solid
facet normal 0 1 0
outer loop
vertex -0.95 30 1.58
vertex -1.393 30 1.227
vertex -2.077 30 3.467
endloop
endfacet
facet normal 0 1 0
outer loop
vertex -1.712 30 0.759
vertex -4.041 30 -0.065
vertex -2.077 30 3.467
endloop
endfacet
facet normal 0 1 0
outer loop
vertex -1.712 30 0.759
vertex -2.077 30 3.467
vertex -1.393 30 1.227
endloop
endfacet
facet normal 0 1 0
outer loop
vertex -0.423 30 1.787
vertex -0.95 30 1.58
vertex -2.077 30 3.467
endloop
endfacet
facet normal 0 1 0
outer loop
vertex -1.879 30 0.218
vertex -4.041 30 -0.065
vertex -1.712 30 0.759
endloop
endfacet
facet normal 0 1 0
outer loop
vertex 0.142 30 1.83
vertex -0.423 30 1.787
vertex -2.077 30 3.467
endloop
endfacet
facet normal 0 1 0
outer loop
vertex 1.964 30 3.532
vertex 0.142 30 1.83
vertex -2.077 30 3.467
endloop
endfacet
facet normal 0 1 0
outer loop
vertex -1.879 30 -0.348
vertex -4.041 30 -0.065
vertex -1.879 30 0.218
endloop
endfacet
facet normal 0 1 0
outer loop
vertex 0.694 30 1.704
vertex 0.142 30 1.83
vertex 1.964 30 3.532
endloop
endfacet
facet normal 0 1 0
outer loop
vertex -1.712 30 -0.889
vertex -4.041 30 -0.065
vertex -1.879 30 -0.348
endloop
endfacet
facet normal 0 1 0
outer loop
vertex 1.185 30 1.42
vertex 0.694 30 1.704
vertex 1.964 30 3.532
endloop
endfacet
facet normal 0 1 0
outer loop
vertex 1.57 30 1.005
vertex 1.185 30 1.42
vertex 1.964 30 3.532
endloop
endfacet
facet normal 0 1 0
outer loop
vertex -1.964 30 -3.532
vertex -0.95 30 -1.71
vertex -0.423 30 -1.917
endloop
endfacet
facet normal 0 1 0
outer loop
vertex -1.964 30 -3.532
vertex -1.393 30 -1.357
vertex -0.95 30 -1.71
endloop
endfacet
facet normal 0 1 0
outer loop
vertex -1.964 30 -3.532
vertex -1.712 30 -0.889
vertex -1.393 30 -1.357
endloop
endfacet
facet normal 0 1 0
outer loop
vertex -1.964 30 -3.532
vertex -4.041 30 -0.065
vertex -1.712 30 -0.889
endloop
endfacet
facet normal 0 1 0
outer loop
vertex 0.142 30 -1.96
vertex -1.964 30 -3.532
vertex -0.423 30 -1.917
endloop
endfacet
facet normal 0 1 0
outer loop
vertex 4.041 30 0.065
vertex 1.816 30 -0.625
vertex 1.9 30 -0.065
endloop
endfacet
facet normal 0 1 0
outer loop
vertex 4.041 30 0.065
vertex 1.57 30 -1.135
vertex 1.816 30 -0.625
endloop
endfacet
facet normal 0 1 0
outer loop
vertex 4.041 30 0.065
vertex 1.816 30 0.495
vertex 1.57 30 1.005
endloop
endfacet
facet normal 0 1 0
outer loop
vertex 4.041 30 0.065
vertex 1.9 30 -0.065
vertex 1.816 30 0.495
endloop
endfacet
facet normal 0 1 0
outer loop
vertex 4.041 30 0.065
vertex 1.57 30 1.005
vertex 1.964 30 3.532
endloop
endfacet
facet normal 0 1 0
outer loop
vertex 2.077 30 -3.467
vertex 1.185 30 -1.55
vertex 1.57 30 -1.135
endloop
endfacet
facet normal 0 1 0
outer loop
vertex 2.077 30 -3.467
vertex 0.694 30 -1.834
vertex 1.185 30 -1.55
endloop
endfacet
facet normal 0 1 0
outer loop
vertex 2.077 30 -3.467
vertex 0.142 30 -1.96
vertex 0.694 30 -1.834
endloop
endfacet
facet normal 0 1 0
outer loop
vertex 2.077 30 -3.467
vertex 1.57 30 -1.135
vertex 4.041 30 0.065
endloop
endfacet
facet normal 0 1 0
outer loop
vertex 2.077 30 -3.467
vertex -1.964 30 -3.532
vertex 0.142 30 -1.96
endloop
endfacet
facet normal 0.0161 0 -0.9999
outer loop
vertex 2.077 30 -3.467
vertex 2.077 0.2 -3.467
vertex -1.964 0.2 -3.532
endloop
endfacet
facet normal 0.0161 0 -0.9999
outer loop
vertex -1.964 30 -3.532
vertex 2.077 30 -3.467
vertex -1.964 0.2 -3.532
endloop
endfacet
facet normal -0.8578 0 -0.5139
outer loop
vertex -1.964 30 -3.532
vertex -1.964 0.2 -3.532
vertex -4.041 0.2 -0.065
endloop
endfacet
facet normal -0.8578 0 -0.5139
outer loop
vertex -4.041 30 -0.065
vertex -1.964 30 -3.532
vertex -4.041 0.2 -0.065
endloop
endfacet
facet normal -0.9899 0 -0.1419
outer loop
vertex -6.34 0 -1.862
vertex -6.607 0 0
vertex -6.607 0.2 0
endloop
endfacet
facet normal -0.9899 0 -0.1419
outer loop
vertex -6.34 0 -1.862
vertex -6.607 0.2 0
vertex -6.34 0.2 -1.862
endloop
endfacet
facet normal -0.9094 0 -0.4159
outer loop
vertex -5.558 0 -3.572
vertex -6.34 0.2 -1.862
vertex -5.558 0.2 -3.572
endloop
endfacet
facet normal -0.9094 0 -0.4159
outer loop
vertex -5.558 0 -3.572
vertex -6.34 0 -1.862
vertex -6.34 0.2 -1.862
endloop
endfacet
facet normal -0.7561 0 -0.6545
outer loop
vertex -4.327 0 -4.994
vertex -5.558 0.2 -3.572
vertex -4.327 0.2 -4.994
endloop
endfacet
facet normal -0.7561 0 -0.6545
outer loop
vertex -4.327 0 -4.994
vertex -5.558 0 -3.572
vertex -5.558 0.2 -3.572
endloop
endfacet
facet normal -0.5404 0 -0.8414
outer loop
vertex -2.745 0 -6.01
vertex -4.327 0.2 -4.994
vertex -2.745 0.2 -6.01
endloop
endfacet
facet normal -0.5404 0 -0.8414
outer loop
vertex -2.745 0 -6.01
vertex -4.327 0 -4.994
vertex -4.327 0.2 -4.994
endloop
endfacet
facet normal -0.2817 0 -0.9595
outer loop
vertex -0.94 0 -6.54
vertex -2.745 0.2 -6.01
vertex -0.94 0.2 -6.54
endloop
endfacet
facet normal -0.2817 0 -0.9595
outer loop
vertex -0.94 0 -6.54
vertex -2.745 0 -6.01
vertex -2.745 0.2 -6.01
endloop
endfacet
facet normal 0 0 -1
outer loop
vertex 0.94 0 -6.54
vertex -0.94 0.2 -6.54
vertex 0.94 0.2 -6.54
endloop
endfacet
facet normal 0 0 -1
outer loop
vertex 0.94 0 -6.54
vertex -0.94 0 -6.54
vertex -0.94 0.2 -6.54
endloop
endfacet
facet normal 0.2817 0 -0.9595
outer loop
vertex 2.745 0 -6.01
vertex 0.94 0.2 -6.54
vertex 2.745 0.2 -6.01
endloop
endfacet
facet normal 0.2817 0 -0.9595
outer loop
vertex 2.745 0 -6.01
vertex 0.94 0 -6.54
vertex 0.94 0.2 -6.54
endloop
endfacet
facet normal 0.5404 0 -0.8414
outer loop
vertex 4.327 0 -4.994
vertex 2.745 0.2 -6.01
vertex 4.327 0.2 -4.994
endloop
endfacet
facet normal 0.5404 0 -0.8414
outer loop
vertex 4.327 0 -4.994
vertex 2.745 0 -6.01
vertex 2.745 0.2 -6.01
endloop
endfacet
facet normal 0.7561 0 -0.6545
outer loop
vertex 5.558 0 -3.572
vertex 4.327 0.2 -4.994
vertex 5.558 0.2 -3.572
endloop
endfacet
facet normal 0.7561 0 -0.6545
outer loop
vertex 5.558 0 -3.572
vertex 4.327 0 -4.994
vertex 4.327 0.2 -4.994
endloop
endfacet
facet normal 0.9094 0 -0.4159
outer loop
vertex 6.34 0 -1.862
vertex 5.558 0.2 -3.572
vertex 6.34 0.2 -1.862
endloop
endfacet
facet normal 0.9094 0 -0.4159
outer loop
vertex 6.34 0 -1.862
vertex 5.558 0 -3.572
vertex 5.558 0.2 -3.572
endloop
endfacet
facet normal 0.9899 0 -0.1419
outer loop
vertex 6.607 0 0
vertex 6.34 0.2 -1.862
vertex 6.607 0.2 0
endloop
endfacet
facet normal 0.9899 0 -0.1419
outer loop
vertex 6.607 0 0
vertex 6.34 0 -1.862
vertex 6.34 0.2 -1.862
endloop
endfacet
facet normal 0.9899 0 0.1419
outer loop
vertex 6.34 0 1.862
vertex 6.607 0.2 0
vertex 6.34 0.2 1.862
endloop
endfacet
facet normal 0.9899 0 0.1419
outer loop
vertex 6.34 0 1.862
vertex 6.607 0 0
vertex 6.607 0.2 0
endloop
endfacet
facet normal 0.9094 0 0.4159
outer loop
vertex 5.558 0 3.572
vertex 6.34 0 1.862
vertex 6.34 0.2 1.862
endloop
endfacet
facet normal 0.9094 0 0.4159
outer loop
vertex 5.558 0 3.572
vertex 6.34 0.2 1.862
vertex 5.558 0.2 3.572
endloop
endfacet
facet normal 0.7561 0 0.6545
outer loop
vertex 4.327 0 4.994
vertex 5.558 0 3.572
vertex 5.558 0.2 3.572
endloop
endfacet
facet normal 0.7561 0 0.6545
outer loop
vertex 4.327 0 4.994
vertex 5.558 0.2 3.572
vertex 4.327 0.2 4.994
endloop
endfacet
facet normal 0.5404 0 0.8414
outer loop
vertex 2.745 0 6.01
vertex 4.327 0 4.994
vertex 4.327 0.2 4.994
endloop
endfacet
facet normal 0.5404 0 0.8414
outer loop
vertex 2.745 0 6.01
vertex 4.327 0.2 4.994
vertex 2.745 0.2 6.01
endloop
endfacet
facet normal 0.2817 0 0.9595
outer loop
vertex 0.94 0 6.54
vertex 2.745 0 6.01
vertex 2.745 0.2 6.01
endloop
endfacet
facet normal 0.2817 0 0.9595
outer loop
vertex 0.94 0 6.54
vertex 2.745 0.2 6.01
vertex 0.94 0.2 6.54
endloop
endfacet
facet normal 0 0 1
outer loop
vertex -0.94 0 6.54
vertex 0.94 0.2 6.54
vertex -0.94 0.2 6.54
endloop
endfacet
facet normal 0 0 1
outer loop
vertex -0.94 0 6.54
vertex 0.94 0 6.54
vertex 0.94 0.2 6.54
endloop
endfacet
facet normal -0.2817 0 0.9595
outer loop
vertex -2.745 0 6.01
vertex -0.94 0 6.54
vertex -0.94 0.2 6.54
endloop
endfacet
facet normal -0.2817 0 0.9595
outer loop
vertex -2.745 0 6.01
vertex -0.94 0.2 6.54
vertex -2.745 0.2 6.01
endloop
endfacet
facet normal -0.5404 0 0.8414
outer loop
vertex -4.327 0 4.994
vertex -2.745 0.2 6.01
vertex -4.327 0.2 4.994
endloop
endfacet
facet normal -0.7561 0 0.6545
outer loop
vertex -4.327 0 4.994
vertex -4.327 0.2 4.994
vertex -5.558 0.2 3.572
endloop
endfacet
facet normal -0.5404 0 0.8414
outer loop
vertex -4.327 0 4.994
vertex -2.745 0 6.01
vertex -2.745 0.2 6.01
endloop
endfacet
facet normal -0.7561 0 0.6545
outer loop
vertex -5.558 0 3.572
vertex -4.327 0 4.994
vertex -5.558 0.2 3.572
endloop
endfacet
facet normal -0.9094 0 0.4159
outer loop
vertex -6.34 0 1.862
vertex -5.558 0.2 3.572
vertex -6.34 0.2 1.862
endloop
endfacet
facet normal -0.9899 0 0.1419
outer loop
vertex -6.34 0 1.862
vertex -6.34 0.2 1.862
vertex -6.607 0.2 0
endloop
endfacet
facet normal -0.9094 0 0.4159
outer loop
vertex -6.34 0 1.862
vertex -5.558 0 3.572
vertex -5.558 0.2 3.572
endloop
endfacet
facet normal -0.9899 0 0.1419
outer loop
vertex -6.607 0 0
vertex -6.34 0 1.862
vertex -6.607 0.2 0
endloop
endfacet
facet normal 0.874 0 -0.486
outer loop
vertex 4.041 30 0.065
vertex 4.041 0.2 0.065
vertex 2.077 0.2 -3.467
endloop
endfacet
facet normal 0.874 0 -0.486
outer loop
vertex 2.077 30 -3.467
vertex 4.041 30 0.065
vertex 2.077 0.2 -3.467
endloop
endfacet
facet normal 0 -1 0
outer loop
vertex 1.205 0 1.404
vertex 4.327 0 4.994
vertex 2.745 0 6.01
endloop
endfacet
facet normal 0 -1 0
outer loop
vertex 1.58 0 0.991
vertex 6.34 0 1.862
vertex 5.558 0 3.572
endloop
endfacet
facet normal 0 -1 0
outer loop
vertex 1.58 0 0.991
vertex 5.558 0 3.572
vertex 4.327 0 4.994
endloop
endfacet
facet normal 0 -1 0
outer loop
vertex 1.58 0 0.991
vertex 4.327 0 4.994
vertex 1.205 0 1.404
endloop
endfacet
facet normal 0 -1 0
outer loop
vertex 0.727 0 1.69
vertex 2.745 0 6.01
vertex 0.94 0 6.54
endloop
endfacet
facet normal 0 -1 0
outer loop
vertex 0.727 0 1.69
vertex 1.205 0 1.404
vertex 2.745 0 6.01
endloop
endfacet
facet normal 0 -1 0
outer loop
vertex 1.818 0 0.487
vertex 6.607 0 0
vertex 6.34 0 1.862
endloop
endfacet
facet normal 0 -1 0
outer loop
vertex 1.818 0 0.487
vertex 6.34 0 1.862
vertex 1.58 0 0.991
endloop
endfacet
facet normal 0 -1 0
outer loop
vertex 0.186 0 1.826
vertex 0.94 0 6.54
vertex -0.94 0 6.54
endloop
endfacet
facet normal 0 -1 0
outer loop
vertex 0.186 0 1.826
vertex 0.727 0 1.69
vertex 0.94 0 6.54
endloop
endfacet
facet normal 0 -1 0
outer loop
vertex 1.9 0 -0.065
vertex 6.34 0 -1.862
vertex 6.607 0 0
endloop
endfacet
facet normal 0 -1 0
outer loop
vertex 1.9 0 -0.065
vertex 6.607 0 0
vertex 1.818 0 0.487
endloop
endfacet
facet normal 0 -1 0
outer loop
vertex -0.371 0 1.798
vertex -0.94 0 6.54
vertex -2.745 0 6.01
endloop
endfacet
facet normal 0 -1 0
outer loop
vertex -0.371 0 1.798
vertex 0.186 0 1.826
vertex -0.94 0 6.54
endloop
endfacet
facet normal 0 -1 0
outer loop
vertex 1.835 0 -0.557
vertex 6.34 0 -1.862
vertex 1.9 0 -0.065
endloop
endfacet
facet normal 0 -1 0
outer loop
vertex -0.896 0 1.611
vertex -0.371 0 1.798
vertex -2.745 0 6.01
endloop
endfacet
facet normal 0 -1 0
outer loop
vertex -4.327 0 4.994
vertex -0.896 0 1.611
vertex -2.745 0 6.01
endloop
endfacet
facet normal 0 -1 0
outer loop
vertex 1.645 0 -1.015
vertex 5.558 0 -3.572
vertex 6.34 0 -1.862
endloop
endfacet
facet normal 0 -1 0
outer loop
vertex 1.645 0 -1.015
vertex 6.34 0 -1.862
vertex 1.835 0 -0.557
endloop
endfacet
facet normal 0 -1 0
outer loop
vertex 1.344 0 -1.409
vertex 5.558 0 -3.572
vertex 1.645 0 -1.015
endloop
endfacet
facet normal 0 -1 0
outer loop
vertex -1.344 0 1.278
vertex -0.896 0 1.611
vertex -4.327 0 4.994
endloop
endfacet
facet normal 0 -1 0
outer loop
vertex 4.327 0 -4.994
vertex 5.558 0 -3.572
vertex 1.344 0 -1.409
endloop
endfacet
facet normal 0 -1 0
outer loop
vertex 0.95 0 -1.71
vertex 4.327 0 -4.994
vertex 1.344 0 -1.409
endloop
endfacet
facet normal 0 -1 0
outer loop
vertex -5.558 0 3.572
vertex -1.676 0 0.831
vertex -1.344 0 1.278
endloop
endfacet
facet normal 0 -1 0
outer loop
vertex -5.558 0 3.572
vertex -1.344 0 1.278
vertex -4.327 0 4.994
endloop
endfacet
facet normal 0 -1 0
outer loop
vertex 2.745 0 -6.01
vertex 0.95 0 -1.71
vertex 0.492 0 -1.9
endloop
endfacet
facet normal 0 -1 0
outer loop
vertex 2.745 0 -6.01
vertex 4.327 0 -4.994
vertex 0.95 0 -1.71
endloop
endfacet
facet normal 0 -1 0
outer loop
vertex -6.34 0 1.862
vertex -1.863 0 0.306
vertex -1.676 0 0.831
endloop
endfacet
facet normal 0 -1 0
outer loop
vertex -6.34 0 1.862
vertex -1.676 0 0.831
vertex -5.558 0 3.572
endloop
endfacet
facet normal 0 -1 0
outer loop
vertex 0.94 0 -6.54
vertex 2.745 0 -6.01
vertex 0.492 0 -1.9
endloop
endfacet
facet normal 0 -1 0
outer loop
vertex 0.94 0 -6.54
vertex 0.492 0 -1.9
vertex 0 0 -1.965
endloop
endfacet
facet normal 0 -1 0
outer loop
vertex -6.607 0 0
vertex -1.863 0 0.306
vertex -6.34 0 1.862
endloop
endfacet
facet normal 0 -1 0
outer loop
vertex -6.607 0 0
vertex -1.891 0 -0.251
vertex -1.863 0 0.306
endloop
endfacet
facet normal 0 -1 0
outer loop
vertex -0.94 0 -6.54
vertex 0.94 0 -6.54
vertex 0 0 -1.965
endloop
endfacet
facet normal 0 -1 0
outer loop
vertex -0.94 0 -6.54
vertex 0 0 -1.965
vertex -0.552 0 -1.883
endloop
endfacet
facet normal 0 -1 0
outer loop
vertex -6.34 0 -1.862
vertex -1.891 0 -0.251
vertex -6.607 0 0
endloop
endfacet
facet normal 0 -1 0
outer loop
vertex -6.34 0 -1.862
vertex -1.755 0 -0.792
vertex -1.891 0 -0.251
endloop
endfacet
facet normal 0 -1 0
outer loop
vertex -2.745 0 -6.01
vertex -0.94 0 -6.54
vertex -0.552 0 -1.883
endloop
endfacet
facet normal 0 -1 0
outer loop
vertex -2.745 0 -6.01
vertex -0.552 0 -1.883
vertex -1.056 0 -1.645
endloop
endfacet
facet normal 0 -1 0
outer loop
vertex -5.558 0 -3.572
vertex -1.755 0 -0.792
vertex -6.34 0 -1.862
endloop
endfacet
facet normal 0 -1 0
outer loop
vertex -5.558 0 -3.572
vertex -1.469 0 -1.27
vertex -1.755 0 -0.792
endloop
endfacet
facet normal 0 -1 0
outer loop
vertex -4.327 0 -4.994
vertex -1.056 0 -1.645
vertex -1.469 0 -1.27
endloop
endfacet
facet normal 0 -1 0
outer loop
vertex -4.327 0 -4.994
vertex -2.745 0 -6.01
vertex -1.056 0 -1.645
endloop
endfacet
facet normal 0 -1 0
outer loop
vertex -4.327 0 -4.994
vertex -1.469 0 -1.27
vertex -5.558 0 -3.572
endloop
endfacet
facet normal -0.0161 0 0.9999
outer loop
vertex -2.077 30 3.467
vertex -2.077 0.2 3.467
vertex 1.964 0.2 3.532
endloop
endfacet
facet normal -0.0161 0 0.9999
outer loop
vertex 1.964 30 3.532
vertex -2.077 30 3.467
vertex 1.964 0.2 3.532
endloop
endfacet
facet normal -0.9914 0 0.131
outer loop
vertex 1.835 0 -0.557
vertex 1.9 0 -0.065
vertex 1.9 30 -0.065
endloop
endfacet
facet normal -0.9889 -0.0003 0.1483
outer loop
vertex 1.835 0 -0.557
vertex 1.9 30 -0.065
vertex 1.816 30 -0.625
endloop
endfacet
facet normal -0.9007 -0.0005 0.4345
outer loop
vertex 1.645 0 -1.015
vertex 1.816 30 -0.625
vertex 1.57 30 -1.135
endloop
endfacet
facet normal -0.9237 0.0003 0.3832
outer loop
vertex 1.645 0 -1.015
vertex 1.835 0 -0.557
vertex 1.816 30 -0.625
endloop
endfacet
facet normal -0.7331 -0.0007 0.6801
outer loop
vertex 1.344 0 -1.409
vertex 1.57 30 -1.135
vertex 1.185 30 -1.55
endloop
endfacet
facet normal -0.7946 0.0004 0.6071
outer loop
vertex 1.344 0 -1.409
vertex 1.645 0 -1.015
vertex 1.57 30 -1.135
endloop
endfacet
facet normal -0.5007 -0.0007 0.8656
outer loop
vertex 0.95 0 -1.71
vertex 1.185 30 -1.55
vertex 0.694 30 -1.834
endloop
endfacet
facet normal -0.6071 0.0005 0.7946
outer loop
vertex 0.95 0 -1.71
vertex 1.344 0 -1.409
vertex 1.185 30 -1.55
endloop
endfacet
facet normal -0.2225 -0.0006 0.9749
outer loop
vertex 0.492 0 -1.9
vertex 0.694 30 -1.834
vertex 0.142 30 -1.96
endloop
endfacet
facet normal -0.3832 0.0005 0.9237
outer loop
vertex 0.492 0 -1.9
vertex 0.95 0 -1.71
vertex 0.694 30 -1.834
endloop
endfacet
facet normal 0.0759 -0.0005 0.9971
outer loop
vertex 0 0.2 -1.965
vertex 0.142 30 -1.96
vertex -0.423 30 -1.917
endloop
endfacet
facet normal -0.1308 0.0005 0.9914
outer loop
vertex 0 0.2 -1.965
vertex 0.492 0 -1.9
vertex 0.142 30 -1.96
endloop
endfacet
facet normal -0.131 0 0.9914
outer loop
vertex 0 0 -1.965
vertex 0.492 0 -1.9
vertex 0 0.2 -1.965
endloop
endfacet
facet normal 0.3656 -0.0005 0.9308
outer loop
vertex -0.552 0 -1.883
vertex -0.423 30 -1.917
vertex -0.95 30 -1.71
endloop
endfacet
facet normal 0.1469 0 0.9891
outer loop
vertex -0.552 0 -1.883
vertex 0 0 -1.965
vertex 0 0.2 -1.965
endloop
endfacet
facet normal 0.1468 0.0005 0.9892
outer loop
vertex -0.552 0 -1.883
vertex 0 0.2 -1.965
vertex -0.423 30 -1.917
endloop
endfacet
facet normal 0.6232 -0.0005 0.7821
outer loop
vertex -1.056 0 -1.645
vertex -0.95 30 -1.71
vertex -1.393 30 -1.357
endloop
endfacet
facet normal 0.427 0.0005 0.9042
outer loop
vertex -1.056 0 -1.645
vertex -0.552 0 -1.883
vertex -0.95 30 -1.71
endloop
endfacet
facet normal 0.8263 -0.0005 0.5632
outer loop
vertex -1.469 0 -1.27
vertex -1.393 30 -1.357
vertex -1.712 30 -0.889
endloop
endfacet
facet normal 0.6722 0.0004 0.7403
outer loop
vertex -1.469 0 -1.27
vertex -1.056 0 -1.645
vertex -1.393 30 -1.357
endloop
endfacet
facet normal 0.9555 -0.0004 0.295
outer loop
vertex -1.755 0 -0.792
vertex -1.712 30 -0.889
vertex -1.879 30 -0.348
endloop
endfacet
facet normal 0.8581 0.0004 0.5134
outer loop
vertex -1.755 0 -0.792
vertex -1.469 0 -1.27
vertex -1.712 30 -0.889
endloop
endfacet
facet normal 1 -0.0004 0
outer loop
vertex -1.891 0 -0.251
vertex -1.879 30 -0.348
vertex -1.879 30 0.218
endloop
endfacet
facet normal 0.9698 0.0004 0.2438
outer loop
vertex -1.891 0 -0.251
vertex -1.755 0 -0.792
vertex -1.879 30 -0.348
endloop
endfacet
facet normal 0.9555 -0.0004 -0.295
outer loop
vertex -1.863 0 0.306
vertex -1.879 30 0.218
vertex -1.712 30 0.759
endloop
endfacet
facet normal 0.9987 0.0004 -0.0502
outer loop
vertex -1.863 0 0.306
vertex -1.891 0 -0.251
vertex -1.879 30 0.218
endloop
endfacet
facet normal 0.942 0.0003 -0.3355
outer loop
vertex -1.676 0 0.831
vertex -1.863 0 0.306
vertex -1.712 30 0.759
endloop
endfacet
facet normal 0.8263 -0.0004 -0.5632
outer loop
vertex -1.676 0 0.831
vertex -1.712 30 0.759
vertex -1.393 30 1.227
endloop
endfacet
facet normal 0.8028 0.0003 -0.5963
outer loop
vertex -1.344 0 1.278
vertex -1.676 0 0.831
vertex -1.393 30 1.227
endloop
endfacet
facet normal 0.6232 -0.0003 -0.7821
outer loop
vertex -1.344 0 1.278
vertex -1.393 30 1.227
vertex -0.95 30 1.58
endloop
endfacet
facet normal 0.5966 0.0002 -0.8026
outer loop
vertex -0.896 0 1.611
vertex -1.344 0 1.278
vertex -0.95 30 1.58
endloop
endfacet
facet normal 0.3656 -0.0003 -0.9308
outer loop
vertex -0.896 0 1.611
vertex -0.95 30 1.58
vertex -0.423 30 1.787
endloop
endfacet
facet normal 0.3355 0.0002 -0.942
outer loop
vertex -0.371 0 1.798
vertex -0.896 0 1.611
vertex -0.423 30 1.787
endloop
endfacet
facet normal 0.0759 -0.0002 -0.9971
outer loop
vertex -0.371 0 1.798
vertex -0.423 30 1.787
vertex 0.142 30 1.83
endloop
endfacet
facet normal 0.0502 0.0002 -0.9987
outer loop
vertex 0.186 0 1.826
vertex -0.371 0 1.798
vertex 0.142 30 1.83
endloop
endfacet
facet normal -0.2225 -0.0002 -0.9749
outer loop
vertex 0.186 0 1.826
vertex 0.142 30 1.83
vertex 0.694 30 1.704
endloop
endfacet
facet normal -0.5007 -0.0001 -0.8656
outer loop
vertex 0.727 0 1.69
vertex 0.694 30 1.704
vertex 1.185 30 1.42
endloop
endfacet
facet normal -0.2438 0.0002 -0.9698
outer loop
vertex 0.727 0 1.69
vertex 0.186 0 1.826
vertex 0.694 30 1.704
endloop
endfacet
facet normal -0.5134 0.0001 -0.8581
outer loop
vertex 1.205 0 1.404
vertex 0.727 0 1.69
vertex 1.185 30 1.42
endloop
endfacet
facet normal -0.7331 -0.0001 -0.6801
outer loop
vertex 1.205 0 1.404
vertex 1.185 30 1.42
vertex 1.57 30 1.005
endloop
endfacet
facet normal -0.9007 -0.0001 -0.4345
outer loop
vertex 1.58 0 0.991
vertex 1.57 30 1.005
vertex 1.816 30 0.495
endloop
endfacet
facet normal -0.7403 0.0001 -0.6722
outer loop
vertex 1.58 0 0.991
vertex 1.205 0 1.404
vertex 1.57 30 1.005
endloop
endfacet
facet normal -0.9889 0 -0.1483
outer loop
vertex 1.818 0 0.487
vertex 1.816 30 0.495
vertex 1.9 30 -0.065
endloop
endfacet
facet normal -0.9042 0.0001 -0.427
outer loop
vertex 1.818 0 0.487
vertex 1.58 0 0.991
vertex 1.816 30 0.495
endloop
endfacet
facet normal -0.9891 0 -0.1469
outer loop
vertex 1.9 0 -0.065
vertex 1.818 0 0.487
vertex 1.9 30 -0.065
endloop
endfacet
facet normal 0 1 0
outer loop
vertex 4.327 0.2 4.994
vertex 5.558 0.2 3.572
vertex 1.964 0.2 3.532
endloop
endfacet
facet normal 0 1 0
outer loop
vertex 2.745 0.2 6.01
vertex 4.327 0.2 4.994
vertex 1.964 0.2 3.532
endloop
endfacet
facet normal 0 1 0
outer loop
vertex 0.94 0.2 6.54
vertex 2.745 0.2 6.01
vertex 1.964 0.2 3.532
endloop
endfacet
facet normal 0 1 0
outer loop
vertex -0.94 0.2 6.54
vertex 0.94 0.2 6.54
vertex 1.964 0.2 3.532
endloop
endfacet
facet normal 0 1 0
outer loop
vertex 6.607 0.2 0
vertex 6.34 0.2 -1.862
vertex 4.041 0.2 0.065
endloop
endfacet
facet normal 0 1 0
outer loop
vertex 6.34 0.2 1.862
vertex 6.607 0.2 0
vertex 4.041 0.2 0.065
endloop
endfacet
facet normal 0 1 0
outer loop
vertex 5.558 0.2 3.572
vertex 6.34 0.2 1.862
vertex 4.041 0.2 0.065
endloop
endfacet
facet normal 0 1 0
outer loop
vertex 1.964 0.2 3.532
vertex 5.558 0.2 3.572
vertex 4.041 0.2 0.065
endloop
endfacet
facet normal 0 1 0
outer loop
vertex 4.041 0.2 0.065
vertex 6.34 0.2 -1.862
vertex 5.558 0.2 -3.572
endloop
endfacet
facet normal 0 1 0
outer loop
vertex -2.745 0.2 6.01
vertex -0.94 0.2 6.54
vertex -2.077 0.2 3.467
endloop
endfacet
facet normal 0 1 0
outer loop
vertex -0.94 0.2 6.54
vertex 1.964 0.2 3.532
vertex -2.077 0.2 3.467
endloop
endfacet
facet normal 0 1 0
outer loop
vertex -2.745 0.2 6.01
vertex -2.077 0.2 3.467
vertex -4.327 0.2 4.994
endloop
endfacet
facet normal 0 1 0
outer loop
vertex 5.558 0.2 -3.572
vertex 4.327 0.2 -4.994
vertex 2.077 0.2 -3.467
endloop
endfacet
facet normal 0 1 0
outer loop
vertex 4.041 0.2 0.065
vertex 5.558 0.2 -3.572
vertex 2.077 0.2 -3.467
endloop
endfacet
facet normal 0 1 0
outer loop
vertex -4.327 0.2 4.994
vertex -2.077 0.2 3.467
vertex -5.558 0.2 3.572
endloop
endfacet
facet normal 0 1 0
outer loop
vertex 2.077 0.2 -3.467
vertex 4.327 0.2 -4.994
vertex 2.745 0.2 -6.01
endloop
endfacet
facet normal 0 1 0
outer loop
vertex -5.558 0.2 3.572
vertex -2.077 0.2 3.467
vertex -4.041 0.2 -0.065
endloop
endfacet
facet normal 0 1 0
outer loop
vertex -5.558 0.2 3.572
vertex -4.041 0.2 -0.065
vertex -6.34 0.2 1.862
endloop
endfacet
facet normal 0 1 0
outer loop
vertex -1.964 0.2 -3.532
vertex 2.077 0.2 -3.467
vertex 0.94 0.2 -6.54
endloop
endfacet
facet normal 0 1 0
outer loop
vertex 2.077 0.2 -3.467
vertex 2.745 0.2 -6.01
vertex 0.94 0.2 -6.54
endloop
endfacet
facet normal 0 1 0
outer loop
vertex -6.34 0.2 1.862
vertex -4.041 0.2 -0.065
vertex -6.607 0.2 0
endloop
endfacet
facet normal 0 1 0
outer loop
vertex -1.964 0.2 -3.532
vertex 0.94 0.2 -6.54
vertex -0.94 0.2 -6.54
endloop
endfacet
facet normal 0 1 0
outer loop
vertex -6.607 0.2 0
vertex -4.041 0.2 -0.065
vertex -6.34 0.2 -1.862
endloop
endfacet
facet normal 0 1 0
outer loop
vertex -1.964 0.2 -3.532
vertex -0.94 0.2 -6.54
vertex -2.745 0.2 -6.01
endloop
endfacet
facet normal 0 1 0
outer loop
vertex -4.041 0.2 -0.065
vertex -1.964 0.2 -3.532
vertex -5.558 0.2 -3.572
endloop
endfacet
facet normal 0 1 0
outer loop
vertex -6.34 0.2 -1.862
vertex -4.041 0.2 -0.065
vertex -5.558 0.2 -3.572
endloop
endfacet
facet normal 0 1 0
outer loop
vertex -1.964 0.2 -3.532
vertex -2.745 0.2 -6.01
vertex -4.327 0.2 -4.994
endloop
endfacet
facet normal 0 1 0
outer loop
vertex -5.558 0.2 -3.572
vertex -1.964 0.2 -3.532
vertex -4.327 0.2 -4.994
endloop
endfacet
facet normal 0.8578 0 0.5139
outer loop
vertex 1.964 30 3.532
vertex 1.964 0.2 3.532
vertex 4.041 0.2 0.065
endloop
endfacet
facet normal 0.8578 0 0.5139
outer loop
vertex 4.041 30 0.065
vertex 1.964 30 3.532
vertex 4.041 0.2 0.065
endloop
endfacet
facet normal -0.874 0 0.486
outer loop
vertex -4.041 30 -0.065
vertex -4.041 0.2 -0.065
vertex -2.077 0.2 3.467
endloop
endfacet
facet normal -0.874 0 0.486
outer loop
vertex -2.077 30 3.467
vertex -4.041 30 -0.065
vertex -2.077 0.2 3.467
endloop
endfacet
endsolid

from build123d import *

# Parameters (mm, degrees)
SKETCH1_R           = 1.9
BOSS_EXTRUDE1_DEPTH = 30
SKETCH3_R           = 6.607376419
SKETCH3_R_2         = 1.965008769
BOSS_EXTRUDE2_DEPTH = 0.2


with BuildPart() as part:
    # Sketch1 → Boss-Extrude1 (new body)
    with BuildSketch(Plane(origin=(0, 0, 0), x_dir=(1, 0, 0), z_dir=(0, 1, 0))):
        Polygon((1.964165255, -3.532051555), (4.040929001, -0.065008769), (2.076763746, 3.467042785), (-1.964165255, 3.532051555), (-4.040929001, 0.065008769), (-2.076763746, -3.467042785), align=None)
        with Locations((0, 0.065008769)):
            Circle(SKETCH1_R, mode=Mode.SUBTRACT)
    extrude(amount=BOSS_EXTRUDE1_DEPTH)

    # Sketch3 → Boss-Extrude2 (add)
    with BuildSketch(Plane(origin=(0, 0, 0), x_dir=(-1, 0, 0), z_dir=(0, -1, 0))):
        Circle(SKETCH3_R)
        Circle(SKETCH3_R_2, mode=Mode.SUBTRACT)
    extrude(amount=-BOSS_EXTRUDE2_DEPTH)


solid = part.part
